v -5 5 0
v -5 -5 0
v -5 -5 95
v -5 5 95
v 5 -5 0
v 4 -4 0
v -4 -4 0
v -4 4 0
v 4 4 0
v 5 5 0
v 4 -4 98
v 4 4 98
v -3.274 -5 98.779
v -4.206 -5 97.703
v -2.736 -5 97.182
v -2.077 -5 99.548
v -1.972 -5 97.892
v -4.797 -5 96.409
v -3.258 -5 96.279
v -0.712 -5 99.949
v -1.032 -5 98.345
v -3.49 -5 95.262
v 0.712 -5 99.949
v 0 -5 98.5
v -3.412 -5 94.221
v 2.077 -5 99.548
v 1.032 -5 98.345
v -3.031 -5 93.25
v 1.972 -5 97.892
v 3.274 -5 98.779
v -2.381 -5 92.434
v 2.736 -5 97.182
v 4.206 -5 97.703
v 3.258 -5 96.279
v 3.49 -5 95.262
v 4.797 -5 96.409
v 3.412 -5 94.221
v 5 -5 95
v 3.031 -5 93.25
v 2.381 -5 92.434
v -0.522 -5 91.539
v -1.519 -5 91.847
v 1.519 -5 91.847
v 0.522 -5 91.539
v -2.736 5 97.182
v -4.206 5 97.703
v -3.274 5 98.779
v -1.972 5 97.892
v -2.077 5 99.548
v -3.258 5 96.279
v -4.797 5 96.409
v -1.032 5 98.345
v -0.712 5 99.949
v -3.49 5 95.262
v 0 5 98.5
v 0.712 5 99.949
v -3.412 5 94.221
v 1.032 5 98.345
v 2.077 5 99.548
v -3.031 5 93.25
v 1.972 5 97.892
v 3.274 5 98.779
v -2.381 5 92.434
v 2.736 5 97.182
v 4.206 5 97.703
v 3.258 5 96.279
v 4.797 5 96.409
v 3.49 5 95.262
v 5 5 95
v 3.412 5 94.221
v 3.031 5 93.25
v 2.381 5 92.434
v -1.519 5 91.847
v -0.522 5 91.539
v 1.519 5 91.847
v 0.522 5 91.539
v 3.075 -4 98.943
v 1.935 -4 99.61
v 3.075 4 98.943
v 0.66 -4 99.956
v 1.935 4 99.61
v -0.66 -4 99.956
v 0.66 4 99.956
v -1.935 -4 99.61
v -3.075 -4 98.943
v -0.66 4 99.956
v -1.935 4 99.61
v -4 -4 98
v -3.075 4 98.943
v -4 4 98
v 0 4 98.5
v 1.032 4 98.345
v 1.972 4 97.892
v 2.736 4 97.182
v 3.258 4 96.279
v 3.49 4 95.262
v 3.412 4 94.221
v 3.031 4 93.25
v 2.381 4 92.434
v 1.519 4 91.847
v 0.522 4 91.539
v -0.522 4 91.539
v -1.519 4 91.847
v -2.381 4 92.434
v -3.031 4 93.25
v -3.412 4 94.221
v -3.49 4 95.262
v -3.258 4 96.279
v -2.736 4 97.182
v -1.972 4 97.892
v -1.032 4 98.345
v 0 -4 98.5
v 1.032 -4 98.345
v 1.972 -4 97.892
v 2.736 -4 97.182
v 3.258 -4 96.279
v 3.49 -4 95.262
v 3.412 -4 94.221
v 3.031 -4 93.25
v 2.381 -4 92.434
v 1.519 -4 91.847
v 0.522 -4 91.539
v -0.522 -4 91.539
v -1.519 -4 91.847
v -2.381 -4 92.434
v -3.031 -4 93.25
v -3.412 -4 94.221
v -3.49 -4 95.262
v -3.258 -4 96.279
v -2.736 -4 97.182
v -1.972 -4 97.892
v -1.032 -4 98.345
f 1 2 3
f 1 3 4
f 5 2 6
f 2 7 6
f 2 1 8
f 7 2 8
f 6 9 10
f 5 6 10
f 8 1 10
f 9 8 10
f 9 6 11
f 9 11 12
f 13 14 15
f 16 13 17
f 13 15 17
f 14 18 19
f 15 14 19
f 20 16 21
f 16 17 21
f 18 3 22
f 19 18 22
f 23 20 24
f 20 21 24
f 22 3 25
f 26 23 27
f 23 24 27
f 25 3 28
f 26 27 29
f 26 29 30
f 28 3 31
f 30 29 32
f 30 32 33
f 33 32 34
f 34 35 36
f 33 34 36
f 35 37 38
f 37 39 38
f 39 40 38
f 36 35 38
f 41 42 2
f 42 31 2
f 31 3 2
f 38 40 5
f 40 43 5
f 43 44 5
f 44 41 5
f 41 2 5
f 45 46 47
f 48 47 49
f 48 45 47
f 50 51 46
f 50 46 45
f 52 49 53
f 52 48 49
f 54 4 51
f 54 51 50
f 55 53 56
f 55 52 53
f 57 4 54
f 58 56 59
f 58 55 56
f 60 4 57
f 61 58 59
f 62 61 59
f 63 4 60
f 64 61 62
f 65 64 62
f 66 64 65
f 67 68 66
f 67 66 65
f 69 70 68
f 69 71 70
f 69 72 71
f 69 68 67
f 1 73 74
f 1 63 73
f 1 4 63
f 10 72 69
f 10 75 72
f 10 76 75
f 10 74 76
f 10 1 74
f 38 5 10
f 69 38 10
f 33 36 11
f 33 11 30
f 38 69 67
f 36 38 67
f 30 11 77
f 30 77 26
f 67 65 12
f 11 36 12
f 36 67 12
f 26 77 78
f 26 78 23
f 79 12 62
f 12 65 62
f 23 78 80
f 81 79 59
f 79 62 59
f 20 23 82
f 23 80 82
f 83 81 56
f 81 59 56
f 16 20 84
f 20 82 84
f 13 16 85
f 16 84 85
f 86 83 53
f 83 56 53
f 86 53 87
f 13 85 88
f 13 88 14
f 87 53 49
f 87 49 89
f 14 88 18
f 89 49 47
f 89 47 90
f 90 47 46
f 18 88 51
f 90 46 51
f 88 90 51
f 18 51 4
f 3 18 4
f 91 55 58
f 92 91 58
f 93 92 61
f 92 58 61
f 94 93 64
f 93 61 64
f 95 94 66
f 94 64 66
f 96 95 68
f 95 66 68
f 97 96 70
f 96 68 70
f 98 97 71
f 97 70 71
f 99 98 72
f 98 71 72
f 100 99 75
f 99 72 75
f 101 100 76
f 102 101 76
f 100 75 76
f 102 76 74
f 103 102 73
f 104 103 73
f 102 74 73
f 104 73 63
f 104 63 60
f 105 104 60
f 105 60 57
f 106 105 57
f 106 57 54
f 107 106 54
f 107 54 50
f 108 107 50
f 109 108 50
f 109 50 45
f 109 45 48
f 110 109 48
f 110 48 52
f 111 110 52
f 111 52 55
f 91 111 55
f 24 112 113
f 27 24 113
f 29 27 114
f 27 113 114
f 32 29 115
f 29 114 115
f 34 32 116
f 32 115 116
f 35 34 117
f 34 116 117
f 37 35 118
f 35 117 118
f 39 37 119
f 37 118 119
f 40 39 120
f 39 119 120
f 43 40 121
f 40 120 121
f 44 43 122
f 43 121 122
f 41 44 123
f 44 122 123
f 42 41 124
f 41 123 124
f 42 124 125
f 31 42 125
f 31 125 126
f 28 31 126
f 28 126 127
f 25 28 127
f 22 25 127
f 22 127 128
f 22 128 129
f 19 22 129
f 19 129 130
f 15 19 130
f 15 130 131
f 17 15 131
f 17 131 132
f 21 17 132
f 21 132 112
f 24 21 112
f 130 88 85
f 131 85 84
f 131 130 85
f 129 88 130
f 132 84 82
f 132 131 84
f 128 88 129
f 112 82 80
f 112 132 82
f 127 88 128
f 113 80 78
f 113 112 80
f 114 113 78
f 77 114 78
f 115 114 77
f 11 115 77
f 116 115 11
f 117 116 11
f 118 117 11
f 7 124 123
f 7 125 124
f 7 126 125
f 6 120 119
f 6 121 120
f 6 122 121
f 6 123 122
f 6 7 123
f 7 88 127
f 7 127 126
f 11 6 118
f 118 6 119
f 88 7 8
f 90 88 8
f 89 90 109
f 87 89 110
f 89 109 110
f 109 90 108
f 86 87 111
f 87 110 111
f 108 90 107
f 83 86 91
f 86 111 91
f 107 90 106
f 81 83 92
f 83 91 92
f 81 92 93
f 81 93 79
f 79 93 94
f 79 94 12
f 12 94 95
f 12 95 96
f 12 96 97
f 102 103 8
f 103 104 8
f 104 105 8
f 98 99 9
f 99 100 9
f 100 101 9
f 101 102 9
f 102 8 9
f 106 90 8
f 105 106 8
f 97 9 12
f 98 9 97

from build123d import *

# Parameters (mm, degrees)
SKETCH_1_W          = 10
SKETCH_1_H          = 10
SKETCH_1_W_2        = 8
SKETCH_1_H_2        = 8
EXTRUDE_1_DEPTH     = 100
SKETCH_2_R          = 3.5
CUT_EXTRUDE_1_DEPTH = 100


with BuildPart() as part:
    # ｽｹｯﾁ1 → ﾎﾞｽ - 押し出し1 (new body)
    with BuildSketch(Plane.XY):
        Rectangle(SKETCH_1_W, SKETCH_1_H)
        Rectangle(SKETCH_1_W_2, SKETCH_1_H_2, mode=Mode.SUBTRACT)
    extrude(amount=EXTRUDE_1_DEPTH)

    # ｽｹｯﾁ2 → ｶｯﾄ - 押し出し1 (cut)
    with BuildSketch(Plane(origin=(0, 5, 0), x_dir=(1, 0, 0), z_dir=(0, 1, 0))):
        with Locations(Location((0, -95, 0), (0, 0, 270))):
            Circle(SKETCH_2_R)
        with BuildLine():
            Line((-5, -95), (-5, -103))
            Line((-5, -103), (5, -103))
            Line((5, -103), (5, -95))
            ThreePointArc((5, -95), (0, -100), (-5, -95))
        make_face()
    extrude(amount=-CUT_EXTRUDE_1_DEPTH, mode=Mode.SUBTRACT)


solid = part.part
